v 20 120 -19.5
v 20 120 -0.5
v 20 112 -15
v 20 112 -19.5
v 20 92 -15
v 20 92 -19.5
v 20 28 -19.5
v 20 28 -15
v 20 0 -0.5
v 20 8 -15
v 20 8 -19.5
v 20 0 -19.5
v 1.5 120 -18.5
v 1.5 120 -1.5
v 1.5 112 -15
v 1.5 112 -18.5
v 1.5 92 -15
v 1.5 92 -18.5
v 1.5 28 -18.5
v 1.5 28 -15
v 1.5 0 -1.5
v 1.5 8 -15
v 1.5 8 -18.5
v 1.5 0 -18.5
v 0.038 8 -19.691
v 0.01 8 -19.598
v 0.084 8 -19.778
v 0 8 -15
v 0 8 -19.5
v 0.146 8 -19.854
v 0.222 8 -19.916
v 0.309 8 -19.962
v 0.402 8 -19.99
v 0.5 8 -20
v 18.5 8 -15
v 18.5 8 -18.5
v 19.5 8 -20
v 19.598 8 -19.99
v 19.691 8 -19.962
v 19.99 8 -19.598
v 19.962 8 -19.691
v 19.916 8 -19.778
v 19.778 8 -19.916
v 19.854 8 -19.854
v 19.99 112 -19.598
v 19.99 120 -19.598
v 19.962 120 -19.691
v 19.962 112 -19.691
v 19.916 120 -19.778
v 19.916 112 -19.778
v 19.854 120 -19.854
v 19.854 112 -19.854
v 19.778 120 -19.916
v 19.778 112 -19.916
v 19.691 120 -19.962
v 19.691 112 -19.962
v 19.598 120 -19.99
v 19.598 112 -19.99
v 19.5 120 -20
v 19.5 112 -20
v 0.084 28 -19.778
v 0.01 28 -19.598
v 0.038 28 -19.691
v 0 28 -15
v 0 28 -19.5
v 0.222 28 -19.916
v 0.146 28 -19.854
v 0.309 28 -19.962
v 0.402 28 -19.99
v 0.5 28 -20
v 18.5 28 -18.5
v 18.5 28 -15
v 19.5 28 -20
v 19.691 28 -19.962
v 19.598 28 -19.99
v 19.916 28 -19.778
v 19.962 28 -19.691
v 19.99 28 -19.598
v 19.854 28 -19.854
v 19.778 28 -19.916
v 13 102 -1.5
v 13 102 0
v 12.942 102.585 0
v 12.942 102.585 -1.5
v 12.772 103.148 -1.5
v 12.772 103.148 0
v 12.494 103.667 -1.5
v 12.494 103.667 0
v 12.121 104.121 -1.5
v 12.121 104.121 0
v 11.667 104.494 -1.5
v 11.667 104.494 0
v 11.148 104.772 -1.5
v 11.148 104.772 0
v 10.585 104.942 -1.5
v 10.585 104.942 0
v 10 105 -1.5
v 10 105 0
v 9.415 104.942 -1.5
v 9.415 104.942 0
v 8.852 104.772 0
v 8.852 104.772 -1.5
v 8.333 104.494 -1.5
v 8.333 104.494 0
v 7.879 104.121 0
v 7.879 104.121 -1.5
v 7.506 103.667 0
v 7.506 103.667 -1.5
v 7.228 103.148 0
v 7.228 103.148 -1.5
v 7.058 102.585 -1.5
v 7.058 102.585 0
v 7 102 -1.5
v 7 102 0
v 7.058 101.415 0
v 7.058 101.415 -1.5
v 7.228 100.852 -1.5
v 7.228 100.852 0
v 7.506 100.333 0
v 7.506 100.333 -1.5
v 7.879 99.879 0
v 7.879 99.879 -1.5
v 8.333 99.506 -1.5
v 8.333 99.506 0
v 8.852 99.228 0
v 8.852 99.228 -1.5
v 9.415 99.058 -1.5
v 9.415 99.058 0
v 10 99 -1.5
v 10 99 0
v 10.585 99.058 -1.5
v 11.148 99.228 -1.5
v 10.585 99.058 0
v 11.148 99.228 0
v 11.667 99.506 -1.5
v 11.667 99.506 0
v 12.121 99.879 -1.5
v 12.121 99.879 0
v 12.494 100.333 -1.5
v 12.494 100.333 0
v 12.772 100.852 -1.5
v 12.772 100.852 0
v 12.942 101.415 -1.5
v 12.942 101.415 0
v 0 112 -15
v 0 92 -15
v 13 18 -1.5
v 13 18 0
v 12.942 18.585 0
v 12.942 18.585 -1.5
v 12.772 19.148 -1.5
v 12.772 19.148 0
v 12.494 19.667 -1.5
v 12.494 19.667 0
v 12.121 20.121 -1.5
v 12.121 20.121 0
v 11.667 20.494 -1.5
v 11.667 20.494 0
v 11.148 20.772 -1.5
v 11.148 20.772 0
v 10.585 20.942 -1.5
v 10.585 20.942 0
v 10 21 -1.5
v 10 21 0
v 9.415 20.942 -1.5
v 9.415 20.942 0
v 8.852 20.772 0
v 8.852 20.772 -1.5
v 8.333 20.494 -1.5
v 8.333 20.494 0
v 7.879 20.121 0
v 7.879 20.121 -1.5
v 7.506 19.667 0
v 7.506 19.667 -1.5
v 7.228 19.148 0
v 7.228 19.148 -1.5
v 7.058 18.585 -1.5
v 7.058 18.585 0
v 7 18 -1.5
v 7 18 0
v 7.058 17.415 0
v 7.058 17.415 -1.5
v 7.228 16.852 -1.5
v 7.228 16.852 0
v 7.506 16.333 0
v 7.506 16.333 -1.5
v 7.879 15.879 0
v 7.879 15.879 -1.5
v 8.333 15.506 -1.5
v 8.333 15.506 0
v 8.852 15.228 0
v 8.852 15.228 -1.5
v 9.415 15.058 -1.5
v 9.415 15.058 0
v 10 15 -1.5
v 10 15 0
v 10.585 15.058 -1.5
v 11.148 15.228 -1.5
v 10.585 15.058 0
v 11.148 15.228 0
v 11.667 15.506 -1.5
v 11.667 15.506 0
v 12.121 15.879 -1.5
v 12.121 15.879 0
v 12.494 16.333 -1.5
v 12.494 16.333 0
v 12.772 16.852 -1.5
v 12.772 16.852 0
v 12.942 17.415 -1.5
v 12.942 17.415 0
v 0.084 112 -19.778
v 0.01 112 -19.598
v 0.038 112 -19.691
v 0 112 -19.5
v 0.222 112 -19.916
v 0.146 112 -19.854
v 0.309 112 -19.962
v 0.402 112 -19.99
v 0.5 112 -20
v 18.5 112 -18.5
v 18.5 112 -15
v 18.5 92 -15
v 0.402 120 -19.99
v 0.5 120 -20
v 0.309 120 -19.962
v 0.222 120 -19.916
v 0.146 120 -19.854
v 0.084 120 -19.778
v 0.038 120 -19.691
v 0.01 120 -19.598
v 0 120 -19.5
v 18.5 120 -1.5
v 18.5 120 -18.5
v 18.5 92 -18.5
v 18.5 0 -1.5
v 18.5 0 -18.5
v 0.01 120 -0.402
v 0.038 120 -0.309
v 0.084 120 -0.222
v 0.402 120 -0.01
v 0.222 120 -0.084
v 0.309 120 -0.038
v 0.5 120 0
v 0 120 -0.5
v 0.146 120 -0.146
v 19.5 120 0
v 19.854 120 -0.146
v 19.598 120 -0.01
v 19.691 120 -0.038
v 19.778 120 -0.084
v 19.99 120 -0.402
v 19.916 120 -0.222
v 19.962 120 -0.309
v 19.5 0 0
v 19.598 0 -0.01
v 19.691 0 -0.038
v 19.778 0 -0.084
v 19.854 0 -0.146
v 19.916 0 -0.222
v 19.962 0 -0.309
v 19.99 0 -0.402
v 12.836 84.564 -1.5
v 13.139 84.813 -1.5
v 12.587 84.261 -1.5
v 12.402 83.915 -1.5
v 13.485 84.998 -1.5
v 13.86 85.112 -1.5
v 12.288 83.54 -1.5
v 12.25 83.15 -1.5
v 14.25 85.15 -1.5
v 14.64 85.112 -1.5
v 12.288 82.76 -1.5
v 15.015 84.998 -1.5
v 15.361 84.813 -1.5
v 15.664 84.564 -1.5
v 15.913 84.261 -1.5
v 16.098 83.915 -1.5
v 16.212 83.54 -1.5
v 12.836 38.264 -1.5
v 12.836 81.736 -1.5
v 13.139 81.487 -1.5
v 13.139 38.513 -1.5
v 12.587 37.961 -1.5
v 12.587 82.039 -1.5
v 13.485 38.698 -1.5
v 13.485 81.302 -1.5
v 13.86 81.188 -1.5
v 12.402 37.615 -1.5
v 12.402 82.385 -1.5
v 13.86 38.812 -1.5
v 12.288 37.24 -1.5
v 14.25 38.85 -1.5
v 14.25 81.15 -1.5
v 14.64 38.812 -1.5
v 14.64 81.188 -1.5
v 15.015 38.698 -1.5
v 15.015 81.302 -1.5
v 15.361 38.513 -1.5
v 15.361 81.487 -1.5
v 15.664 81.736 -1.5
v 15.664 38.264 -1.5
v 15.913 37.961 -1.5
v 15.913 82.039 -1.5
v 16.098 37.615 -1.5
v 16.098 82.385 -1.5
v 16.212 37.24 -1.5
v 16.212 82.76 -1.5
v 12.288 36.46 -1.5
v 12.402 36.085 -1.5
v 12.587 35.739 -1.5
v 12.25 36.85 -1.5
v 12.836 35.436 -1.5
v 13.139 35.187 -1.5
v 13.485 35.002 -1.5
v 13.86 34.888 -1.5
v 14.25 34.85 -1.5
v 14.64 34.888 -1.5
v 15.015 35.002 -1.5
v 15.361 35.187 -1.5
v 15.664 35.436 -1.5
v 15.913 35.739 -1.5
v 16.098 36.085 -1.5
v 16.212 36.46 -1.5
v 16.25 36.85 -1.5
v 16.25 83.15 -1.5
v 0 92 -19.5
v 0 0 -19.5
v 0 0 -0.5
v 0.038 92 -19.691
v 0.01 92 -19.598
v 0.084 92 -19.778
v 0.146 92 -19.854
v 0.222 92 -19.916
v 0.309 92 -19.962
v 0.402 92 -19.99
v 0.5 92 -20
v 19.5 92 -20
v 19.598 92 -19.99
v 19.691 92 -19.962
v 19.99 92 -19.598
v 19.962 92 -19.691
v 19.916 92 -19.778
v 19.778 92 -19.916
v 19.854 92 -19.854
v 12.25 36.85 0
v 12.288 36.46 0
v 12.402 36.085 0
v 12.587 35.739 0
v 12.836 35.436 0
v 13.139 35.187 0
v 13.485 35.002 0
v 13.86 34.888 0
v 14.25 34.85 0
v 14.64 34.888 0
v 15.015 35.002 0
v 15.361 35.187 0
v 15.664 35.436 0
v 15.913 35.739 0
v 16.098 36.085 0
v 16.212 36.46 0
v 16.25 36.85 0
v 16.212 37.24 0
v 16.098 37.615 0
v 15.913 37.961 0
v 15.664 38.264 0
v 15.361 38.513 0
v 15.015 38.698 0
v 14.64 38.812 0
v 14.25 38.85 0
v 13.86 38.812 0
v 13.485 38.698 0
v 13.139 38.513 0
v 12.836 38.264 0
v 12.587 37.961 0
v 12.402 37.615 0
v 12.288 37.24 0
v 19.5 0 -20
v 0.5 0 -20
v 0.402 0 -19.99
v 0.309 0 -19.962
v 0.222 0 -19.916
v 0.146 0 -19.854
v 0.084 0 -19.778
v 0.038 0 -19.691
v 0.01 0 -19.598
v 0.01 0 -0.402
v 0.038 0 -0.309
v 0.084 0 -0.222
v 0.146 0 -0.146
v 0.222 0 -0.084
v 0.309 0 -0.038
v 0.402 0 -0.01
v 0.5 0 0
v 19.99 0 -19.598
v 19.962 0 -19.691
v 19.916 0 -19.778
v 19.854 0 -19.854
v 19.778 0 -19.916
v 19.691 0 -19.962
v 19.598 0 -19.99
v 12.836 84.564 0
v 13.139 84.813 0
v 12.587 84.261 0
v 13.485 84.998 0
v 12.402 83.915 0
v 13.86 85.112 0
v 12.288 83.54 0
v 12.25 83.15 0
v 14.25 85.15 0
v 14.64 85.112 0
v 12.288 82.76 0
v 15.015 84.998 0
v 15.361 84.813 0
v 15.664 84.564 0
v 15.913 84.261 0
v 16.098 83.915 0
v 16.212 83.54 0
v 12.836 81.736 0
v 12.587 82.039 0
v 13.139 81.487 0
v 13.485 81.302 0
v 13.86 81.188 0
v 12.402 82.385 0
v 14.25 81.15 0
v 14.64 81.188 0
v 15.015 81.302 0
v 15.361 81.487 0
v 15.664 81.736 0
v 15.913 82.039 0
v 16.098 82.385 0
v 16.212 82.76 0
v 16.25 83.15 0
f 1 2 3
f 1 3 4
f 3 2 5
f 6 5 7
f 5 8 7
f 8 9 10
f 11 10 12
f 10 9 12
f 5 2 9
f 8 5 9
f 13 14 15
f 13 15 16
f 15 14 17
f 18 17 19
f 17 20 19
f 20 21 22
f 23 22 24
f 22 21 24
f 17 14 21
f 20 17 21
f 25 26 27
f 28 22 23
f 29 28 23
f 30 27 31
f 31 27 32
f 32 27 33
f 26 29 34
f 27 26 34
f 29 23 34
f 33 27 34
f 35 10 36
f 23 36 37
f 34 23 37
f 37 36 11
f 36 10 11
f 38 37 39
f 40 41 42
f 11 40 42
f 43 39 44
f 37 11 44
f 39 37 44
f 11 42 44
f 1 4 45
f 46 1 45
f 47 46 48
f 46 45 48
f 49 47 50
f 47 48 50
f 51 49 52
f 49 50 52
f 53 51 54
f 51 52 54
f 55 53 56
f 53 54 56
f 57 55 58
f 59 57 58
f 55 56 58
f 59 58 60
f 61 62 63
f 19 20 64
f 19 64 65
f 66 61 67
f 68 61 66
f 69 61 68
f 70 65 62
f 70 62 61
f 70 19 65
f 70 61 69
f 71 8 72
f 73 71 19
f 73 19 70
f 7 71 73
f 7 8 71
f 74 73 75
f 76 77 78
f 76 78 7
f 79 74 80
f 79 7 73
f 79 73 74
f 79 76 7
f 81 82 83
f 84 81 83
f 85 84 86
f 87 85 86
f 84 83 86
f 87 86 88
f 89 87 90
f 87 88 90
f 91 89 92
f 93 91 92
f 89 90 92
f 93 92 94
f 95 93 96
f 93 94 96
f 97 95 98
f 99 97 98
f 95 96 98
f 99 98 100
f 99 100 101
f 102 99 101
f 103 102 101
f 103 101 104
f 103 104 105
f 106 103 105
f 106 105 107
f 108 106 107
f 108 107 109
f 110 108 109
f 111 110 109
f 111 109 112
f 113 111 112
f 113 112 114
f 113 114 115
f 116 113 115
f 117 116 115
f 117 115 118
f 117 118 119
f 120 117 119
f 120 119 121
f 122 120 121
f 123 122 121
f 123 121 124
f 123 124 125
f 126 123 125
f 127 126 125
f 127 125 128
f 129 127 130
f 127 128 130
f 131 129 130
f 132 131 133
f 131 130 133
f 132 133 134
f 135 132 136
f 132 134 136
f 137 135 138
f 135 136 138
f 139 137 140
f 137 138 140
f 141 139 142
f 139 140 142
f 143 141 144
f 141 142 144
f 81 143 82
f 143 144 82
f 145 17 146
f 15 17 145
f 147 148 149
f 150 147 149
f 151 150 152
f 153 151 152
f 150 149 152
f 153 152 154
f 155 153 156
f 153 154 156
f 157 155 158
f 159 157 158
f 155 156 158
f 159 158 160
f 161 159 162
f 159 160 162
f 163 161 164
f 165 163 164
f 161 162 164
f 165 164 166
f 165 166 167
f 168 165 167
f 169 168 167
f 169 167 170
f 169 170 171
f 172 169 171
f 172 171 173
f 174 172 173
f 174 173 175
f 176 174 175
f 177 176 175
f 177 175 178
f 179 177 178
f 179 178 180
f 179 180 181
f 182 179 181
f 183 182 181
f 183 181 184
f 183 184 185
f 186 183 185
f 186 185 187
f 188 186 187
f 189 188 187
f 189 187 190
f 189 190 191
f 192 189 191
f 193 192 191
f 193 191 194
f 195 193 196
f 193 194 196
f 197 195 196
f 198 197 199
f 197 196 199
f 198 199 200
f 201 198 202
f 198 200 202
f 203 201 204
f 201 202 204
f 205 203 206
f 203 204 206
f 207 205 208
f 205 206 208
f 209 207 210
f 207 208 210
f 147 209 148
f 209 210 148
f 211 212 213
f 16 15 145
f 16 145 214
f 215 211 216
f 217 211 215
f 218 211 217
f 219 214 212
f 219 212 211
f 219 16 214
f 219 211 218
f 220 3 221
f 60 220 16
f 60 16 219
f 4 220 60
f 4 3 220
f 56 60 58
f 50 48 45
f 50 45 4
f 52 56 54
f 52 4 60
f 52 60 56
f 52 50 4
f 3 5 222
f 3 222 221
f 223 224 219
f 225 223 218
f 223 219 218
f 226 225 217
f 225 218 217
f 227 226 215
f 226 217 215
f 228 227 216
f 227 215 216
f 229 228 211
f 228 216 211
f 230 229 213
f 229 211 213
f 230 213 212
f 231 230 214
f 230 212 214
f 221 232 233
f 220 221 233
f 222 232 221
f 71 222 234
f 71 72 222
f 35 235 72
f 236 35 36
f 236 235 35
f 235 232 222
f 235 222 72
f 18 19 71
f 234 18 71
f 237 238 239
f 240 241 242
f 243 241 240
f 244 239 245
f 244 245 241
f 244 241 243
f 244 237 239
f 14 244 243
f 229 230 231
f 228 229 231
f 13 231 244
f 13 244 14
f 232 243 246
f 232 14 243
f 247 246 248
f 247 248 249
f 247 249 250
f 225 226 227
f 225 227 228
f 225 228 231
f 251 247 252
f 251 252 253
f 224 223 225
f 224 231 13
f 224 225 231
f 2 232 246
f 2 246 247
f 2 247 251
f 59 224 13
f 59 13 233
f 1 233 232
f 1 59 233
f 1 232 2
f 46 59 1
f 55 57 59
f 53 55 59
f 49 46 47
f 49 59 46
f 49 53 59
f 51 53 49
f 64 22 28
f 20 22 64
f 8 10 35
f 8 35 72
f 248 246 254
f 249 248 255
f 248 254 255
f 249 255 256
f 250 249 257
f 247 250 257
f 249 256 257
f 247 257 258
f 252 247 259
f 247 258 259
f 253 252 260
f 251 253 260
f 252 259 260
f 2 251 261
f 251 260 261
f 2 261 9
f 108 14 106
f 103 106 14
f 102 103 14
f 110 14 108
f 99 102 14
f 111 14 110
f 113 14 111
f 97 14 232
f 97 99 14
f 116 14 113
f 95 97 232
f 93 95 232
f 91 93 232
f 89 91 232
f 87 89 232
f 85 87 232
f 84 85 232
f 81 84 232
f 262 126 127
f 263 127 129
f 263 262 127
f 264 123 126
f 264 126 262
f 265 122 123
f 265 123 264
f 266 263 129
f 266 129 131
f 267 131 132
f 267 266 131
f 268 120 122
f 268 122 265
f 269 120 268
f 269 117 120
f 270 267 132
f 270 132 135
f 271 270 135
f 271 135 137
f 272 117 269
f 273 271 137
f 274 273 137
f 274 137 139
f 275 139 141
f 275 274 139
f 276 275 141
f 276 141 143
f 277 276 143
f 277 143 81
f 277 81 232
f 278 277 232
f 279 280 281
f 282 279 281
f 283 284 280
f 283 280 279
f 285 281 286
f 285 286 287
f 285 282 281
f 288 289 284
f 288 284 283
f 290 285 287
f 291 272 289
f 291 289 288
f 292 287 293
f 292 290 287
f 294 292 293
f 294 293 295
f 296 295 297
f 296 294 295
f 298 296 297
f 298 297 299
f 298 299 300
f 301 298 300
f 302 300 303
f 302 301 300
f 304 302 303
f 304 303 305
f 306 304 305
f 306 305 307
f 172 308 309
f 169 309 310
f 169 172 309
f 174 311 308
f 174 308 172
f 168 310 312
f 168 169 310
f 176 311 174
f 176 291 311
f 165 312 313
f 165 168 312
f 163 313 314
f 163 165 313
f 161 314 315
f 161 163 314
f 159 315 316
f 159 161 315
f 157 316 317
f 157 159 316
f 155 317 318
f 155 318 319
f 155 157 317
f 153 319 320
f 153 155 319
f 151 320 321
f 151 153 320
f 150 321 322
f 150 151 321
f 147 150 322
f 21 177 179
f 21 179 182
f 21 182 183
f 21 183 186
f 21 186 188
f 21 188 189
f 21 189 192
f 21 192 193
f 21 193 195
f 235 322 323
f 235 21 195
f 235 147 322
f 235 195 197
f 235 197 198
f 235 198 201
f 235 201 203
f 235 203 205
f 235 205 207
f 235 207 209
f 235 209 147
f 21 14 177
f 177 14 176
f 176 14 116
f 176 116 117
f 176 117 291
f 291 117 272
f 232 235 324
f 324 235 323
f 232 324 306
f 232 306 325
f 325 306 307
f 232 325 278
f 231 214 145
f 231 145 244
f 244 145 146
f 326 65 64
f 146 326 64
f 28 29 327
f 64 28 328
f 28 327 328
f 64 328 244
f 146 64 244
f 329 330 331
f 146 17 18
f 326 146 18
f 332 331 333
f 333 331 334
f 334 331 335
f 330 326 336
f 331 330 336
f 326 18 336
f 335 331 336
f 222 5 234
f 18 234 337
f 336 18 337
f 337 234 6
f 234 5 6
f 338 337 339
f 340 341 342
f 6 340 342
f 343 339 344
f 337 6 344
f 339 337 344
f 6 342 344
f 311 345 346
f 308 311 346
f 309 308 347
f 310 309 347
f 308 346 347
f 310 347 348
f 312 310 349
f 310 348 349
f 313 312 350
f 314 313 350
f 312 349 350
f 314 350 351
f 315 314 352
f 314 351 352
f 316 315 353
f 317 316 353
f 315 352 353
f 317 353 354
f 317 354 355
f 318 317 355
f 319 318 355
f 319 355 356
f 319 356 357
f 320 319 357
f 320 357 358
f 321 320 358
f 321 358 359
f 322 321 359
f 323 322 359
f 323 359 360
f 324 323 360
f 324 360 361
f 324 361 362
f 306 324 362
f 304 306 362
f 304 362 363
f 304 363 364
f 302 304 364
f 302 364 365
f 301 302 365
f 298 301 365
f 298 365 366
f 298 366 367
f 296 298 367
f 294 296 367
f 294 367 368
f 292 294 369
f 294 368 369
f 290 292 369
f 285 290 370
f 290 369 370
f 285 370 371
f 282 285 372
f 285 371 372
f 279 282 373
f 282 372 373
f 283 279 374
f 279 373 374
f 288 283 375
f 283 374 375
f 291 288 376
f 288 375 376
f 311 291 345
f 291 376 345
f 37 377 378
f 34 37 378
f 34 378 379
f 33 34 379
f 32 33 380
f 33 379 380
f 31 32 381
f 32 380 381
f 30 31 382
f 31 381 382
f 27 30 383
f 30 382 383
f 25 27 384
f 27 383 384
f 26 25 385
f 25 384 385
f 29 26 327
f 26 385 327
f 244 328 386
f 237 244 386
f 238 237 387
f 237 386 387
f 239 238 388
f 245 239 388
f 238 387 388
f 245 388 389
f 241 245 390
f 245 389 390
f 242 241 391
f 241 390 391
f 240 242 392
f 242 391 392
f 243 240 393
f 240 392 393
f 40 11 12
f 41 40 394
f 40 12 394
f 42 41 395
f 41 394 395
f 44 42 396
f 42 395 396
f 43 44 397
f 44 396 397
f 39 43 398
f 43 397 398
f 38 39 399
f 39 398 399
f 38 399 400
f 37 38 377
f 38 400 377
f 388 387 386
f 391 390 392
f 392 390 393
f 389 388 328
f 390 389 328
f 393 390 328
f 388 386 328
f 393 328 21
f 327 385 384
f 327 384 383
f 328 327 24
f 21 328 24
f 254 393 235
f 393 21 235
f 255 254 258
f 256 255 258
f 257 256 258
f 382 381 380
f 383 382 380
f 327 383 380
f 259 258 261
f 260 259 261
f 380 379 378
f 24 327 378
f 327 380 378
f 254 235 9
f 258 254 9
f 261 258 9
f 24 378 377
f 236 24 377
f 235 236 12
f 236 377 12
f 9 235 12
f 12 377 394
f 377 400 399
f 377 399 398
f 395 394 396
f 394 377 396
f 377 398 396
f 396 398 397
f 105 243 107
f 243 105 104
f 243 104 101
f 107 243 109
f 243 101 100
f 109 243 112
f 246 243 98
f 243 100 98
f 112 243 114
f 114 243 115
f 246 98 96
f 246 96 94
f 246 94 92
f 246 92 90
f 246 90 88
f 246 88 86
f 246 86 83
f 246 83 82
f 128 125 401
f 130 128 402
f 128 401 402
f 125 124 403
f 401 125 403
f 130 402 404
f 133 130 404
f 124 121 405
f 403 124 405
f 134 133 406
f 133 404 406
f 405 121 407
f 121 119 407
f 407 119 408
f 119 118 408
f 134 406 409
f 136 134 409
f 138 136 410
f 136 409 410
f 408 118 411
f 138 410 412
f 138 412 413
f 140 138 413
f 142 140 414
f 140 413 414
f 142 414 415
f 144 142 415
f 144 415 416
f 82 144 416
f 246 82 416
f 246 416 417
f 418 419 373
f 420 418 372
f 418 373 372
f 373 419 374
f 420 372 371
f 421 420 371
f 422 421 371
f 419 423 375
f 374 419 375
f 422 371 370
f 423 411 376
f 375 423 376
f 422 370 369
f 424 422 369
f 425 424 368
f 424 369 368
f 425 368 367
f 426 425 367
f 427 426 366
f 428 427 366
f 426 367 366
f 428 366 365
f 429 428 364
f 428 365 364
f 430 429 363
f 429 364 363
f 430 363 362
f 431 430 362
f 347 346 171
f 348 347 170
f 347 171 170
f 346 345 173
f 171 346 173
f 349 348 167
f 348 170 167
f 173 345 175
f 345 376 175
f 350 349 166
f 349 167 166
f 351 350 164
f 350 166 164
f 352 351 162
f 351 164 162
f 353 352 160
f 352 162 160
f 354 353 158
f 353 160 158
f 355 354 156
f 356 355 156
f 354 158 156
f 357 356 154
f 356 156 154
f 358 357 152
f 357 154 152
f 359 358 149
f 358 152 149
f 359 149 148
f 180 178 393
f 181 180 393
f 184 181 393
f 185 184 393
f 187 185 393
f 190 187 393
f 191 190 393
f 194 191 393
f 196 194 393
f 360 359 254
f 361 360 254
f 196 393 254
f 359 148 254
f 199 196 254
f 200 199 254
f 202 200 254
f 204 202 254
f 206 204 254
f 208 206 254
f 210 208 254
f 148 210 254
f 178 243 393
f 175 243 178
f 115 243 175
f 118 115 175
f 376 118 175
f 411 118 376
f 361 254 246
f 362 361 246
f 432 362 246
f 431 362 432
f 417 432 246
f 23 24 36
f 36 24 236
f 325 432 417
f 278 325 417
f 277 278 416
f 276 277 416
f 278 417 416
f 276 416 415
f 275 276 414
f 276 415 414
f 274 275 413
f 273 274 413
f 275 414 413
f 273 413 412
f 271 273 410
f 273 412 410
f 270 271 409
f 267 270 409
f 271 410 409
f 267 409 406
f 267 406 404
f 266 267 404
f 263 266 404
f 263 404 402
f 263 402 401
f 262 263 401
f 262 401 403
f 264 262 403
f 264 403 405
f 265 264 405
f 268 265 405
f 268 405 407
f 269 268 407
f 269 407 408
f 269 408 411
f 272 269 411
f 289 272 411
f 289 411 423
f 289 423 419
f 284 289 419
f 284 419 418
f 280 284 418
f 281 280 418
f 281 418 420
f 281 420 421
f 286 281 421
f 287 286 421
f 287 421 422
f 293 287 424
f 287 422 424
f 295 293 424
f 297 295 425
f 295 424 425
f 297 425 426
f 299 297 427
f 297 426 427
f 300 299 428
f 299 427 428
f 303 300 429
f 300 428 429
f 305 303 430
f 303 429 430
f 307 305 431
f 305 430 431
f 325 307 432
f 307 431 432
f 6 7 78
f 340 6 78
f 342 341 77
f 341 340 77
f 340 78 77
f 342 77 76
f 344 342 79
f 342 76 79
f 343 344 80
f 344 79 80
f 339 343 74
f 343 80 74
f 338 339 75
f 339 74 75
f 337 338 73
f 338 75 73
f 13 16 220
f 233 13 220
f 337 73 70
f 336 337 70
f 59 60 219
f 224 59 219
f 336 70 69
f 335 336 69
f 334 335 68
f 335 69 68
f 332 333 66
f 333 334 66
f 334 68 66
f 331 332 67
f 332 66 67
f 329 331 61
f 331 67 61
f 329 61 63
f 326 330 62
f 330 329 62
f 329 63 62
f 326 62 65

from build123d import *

# Parameters (mm, degrees)
SKETCH1_W           = 17
SKETCH1_H           = 17
BOSS_EXTRUDE1_DEPTH = 120
SKETCH2_W           = 5
SKETCH2_H           = 20
CUT_EXTRUDE1_DEPTH  = 124.288280059
SKETCH3_R           = 3
CUT_EXTRUDE2_DEPTH  = 100
SKETCH4_R           = 2
CUT_EXTRUDE3_DEPTH  = 10


with BuildPart() as part:
    # Sketch1 → Boss-Extrude1 (new body)
    with BuildSketch(Plane(origin=(0, 0, 0), x_dir=(1, 0, 0), z_dir=(0, 1, 0))):
        with BuildLine():
            Line((0.5, 0), (19.5, 0))
            ThreePointArc((19.5, 0), (19.853553391, 0.146446609), (20, 0.5))
            Line((20, 0.5), (20, 19.5))
            ThreePointArc((20, 19.5), (19.853553391, 19.853553391), (19.5, 20))
            Line((19.5, 20), (0.5, 20))
            ThreePointArc((0.5, 20), (0.146446609, 19.853553391), (0, 19.5))
            Line((0, 19.5), (0, 0.5))
            ThreePointArc((0, 0.5), (0.146446609, 0.146446609), (0.5, 0))
        make_face()
        with Locations((10, 10)):
            Rectangle(SKETCH1_W, SKETCH1_H, mode=Mode.SUBTRACT)
    extrude(amount=BOSS_EXTRUDE1_DEPTH)

    # Sketch2 → Cut-Extrude1 (cut, through all)
    with BuildSketch(Plane(origin=(20, 0, 0), x_dir=(0, 0, -1), z_dir=(1, 0, 0))):
        with Locations((17.5, 102)):
            Rectangle(SKETCH2_W, SKETCH2_H)
        with Locations((17.5, 18)):
            Rectangle(SKETCH2_W, SKETCH2_H)
    extrude(amount=-CUT_EXTRUDE1_DEPTH, mode=Mode.SUBTRACT)

    # Sketch3 → Cut-Extrude2 (cut)
    with BuildSketch(Plane.XY):
        with Locations((10, 102)):
            Circle(SKETCH3_R)
        with Locations((10, 18)):
            Circle(SKETCH3_R)
    extrude(amount=-CUT_EXTRUDE2_DEPTH, mode=Mode.SUBTRACT)

    # Sketch4 → Cut-Extrude3 (cut)
    with BuildSketch(Plane.XY):
        with Locations((14.25, 83.15)):
            Circle(SKETCH4_R)
        with Locations(Location((14.25, 36.85, 0), (0, 0, 180))):
            Circle(SKETCH4_R)
    extrude(amount=-CUT_EXTRUDE3_DEPTH, mode=Mode.SUBTRACT)


solid = part.part
